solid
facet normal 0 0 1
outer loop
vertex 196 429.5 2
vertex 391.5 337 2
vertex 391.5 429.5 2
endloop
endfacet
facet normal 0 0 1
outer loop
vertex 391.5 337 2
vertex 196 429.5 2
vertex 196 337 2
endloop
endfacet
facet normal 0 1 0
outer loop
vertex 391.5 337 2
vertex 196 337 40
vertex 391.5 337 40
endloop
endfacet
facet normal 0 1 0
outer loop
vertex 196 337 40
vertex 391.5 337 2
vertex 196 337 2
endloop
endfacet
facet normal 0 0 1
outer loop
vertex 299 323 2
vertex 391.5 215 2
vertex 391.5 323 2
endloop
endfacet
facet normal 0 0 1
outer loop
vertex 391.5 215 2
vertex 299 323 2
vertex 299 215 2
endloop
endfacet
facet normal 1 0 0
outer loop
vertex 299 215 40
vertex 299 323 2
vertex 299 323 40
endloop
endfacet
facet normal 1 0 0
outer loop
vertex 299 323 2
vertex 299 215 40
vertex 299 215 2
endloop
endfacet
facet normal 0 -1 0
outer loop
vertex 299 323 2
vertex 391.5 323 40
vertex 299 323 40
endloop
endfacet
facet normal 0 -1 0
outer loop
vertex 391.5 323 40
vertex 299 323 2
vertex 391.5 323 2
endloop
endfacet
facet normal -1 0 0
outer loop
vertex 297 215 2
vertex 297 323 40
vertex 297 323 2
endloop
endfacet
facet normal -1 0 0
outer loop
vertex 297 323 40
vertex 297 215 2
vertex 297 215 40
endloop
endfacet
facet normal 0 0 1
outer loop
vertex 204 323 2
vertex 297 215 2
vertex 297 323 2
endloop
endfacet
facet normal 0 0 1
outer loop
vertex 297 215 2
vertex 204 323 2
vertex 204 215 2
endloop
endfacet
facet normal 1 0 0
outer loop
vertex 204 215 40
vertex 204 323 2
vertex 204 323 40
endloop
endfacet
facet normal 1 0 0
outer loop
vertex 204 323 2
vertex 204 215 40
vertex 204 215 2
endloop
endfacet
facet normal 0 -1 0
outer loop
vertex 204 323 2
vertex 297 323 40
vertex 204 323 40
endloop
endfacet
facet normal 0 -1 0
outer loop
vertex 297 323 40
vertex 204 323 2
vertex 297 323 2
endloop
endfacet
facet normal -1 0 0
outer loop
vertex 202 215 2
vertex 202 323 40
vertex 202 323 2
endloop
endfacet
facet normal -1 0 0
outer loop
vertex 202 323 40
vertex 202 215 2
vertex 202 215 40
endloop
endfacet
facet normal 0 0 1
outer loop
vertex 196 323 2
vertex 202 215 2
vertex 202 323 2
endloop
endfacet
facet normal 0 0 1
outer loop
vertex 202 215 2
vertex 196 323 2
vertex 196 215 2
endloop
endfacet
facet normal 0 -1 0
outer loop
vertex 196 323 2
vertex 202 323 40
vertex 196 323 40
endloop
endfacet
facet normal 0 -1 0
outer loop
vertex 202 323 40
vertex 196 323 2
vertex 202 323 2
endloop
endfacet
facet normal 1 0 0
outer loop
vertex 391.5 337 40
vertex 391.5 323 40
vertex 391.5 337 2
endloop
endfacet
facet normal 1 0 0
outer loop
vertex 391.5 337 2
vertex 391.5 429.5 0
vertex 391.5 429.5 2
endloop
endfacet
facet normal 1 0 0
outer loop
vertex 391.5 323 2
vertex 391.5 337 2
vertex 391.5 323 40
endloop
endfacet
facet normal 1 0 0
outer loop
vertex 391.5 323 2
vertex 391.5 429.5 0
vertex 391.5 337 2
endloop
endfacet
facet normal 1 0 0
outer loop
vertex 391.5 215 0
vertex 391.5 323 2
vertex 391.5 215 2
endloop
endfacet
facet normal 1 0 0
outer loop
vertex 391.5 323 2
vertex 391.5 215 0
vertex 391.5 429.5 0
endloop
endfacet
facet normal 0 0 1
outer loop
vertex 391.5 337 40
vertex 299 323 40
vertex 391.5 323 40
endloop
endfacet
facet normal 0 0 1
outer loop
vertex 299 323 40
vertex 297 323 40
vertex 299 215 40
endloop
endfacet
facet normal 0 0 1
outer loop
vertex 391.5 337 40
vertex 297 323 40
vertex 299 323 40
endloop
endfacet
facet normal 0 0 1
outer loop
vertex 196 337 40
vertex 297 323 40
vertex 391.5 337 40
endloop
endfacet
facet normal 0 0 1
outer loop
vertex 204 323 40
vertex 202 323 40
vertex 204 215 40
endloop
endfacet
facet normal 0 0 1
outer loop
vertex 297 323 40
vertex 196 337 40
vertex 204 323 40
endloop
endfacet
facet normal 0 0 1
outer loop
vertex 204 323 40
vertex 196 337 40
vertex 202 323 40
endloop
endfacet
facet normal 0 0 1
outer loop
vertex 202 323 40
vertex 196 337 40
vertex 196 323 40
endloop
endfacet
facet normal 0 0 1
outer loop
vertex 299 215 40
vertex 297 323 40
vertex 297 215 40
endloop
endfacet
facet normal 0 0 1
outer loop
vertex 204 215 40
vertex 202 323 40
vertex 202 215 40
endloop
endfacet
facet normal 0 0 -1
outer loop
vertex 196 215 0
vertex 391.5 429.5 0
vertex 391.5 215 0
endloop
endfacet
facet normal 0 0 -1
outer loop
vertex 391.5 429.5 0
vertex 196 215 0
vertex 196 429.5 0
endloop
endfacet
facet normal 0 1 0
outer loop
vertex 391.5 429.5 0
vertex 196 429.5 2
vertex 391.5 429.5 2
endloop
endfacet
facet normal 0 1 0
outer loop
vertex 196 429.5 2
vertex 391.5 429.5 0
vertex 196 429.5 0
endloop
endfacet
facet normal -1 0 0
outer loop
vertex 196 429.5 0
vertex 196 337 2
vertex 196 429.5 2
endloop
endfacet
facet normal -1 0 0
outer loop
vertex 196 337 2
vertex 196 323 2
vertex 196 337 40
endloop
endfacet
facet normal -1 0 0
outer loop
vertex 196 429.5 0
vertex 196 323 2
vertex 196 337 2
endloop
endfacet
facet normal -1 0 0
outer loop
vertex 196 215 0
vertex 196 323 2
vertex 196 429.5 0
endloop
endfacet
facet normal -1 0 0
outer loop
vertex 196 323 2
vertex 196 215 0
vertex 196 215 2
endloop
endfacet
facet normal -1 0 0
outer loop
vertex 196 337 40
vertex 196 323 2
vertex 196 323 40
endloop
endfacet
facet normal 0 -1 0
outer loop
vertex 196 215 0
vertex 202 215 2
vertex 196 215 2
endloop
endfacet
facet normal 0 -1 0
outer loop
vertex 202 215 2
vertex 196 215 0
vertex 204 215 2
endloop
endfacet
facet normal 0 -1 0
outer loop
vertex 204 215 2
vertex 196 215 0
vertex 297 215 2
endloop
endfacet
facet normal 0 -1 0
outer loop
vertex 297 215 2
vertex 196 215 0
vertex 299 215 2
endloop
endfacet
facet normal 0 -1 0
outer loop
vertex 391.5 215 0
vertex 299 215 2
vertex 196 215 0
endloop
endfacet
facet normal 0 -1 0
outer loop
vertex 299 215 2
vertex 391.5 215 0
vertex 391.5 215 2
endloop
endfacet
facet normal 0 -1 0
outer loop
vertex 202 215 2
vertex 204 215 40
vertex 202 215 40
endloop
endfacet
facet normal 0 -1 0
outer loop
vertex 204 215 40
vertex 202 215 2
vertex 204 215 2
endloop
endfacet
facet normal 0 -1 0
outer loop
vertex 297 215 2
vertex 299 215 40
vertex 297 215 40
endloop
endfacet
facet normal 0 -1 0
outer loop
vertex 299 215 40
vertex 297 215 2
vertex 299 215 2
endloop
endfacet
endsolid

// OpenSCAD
// To be used with OpenScad.
width = 392;
depth = 430;
height = 80;

wall = 2;
tol = 1;


module boxes() {
// Weapon stacks.
weapon_depth = 125;
weapon_stack_1_width = 102;
translate([0, depth - weapon_depth])
cube([weapon_stack_1_width, weapon_depth, height]);

weapon_stack_2_width = 70;
translate([0, depth - weapon_depth * 2 - wall, 0])
cube([weapon_stack_2_width, weapon_depth, height]);

// Characters.
characters_width = width - weapon_stack_1_width - wall;
character_depth = 93;

translate([width - characters_width, depth - character_depth, 0])
cube([characters_width, character_depth, height]);

// Monsters.
monster_width = character_depth;
monster_12_depth = 323;
monster_3_depth = 125;
character_to_monster_depth = depth - character_depth - monster_12_depth;
monster_3_translate_depth = depth - character_depth - character_to_monster_depth - monster_3_depth;

translate([width - monster_width, 0, 0])
cube([monster_width, monster_12_depth, height]);

translate([width - monster_width * 2 - wall, 0, 0])
cube([monster_width, monster_12_depth, height]);

translate([width - monster_width * 3 - wall * 2, monster_3_translate_depth, 0])
cube([monster_width, monster_3_depth, height]);

// Havok deck.
havok_depth = 7;

translate([width - monster_width * 3 - wall * 2, monster_3_translate_depth - wall - havok_depth, 0])
cube([monster_width, havok_depth, height]);

// Attrition decks.
attrition_depth = 48;
blood_width = attrition_depth;
blood_depth = 10;
quest_width = 32;
attrition_width = 22;

translate([width - monster_width * 3 - wall * 2 + (monster_width - blood_width) / 2, monster_3_translate_depth - wall * 2 - havok_depth - blood_depth, 0])
cube([blood_width, blood_depth, height]);

translate([width - monster_width * 3 - wall * 3 - quest_width, depth - weapon_depth - wall - attrition_depth, 0])
cube([quest_width, attrition_depth, height]);

translate([width - monster_width * 3 - wall * 3 - attrition_width, depth - weapon_depth - wall * 2 - attrition_depth * 2, 0])
cube([attrition_width, attrition_depth, height]);

// Equipments.
equipment_width = 66;
equipment_1_depth = 105;
equipment_23_depth = 170;
equipment_special_depth = 60;

cube([equipment_width, equipment_1_depth, height]);

translate([0, equipment_1_depth + wall, 0])
cube([equipment_width, equipment_special_depth, height]);

translate([equipment_width + wall, 0, 0])
cube([equipment_width, equipment_23_depth, height]);

translate([(equipment_width + wall) * 2, 0, 0])
cube([equipment_width, equipment_23_depth, height]);
}

module insert() {
difference() {
translate([0.5, 0.5, 0])
cube([width - 1, depth - 1, height / 2]);

translate([0, 0, 2])
boxes();
}
}

module quarter() {
translate([0, 0, -1])
cube([width / 2, depth / 2, height + 2]);
}

intersection() {
insert();

// translate([0, 0, 0])
// quarter();

// translate([0, depth / 2, 0])
// quarter();

// translate([width / 2, 0, 0])
// quarter();

translate([width / 2, depth / 2, 0])
quarter();
}
